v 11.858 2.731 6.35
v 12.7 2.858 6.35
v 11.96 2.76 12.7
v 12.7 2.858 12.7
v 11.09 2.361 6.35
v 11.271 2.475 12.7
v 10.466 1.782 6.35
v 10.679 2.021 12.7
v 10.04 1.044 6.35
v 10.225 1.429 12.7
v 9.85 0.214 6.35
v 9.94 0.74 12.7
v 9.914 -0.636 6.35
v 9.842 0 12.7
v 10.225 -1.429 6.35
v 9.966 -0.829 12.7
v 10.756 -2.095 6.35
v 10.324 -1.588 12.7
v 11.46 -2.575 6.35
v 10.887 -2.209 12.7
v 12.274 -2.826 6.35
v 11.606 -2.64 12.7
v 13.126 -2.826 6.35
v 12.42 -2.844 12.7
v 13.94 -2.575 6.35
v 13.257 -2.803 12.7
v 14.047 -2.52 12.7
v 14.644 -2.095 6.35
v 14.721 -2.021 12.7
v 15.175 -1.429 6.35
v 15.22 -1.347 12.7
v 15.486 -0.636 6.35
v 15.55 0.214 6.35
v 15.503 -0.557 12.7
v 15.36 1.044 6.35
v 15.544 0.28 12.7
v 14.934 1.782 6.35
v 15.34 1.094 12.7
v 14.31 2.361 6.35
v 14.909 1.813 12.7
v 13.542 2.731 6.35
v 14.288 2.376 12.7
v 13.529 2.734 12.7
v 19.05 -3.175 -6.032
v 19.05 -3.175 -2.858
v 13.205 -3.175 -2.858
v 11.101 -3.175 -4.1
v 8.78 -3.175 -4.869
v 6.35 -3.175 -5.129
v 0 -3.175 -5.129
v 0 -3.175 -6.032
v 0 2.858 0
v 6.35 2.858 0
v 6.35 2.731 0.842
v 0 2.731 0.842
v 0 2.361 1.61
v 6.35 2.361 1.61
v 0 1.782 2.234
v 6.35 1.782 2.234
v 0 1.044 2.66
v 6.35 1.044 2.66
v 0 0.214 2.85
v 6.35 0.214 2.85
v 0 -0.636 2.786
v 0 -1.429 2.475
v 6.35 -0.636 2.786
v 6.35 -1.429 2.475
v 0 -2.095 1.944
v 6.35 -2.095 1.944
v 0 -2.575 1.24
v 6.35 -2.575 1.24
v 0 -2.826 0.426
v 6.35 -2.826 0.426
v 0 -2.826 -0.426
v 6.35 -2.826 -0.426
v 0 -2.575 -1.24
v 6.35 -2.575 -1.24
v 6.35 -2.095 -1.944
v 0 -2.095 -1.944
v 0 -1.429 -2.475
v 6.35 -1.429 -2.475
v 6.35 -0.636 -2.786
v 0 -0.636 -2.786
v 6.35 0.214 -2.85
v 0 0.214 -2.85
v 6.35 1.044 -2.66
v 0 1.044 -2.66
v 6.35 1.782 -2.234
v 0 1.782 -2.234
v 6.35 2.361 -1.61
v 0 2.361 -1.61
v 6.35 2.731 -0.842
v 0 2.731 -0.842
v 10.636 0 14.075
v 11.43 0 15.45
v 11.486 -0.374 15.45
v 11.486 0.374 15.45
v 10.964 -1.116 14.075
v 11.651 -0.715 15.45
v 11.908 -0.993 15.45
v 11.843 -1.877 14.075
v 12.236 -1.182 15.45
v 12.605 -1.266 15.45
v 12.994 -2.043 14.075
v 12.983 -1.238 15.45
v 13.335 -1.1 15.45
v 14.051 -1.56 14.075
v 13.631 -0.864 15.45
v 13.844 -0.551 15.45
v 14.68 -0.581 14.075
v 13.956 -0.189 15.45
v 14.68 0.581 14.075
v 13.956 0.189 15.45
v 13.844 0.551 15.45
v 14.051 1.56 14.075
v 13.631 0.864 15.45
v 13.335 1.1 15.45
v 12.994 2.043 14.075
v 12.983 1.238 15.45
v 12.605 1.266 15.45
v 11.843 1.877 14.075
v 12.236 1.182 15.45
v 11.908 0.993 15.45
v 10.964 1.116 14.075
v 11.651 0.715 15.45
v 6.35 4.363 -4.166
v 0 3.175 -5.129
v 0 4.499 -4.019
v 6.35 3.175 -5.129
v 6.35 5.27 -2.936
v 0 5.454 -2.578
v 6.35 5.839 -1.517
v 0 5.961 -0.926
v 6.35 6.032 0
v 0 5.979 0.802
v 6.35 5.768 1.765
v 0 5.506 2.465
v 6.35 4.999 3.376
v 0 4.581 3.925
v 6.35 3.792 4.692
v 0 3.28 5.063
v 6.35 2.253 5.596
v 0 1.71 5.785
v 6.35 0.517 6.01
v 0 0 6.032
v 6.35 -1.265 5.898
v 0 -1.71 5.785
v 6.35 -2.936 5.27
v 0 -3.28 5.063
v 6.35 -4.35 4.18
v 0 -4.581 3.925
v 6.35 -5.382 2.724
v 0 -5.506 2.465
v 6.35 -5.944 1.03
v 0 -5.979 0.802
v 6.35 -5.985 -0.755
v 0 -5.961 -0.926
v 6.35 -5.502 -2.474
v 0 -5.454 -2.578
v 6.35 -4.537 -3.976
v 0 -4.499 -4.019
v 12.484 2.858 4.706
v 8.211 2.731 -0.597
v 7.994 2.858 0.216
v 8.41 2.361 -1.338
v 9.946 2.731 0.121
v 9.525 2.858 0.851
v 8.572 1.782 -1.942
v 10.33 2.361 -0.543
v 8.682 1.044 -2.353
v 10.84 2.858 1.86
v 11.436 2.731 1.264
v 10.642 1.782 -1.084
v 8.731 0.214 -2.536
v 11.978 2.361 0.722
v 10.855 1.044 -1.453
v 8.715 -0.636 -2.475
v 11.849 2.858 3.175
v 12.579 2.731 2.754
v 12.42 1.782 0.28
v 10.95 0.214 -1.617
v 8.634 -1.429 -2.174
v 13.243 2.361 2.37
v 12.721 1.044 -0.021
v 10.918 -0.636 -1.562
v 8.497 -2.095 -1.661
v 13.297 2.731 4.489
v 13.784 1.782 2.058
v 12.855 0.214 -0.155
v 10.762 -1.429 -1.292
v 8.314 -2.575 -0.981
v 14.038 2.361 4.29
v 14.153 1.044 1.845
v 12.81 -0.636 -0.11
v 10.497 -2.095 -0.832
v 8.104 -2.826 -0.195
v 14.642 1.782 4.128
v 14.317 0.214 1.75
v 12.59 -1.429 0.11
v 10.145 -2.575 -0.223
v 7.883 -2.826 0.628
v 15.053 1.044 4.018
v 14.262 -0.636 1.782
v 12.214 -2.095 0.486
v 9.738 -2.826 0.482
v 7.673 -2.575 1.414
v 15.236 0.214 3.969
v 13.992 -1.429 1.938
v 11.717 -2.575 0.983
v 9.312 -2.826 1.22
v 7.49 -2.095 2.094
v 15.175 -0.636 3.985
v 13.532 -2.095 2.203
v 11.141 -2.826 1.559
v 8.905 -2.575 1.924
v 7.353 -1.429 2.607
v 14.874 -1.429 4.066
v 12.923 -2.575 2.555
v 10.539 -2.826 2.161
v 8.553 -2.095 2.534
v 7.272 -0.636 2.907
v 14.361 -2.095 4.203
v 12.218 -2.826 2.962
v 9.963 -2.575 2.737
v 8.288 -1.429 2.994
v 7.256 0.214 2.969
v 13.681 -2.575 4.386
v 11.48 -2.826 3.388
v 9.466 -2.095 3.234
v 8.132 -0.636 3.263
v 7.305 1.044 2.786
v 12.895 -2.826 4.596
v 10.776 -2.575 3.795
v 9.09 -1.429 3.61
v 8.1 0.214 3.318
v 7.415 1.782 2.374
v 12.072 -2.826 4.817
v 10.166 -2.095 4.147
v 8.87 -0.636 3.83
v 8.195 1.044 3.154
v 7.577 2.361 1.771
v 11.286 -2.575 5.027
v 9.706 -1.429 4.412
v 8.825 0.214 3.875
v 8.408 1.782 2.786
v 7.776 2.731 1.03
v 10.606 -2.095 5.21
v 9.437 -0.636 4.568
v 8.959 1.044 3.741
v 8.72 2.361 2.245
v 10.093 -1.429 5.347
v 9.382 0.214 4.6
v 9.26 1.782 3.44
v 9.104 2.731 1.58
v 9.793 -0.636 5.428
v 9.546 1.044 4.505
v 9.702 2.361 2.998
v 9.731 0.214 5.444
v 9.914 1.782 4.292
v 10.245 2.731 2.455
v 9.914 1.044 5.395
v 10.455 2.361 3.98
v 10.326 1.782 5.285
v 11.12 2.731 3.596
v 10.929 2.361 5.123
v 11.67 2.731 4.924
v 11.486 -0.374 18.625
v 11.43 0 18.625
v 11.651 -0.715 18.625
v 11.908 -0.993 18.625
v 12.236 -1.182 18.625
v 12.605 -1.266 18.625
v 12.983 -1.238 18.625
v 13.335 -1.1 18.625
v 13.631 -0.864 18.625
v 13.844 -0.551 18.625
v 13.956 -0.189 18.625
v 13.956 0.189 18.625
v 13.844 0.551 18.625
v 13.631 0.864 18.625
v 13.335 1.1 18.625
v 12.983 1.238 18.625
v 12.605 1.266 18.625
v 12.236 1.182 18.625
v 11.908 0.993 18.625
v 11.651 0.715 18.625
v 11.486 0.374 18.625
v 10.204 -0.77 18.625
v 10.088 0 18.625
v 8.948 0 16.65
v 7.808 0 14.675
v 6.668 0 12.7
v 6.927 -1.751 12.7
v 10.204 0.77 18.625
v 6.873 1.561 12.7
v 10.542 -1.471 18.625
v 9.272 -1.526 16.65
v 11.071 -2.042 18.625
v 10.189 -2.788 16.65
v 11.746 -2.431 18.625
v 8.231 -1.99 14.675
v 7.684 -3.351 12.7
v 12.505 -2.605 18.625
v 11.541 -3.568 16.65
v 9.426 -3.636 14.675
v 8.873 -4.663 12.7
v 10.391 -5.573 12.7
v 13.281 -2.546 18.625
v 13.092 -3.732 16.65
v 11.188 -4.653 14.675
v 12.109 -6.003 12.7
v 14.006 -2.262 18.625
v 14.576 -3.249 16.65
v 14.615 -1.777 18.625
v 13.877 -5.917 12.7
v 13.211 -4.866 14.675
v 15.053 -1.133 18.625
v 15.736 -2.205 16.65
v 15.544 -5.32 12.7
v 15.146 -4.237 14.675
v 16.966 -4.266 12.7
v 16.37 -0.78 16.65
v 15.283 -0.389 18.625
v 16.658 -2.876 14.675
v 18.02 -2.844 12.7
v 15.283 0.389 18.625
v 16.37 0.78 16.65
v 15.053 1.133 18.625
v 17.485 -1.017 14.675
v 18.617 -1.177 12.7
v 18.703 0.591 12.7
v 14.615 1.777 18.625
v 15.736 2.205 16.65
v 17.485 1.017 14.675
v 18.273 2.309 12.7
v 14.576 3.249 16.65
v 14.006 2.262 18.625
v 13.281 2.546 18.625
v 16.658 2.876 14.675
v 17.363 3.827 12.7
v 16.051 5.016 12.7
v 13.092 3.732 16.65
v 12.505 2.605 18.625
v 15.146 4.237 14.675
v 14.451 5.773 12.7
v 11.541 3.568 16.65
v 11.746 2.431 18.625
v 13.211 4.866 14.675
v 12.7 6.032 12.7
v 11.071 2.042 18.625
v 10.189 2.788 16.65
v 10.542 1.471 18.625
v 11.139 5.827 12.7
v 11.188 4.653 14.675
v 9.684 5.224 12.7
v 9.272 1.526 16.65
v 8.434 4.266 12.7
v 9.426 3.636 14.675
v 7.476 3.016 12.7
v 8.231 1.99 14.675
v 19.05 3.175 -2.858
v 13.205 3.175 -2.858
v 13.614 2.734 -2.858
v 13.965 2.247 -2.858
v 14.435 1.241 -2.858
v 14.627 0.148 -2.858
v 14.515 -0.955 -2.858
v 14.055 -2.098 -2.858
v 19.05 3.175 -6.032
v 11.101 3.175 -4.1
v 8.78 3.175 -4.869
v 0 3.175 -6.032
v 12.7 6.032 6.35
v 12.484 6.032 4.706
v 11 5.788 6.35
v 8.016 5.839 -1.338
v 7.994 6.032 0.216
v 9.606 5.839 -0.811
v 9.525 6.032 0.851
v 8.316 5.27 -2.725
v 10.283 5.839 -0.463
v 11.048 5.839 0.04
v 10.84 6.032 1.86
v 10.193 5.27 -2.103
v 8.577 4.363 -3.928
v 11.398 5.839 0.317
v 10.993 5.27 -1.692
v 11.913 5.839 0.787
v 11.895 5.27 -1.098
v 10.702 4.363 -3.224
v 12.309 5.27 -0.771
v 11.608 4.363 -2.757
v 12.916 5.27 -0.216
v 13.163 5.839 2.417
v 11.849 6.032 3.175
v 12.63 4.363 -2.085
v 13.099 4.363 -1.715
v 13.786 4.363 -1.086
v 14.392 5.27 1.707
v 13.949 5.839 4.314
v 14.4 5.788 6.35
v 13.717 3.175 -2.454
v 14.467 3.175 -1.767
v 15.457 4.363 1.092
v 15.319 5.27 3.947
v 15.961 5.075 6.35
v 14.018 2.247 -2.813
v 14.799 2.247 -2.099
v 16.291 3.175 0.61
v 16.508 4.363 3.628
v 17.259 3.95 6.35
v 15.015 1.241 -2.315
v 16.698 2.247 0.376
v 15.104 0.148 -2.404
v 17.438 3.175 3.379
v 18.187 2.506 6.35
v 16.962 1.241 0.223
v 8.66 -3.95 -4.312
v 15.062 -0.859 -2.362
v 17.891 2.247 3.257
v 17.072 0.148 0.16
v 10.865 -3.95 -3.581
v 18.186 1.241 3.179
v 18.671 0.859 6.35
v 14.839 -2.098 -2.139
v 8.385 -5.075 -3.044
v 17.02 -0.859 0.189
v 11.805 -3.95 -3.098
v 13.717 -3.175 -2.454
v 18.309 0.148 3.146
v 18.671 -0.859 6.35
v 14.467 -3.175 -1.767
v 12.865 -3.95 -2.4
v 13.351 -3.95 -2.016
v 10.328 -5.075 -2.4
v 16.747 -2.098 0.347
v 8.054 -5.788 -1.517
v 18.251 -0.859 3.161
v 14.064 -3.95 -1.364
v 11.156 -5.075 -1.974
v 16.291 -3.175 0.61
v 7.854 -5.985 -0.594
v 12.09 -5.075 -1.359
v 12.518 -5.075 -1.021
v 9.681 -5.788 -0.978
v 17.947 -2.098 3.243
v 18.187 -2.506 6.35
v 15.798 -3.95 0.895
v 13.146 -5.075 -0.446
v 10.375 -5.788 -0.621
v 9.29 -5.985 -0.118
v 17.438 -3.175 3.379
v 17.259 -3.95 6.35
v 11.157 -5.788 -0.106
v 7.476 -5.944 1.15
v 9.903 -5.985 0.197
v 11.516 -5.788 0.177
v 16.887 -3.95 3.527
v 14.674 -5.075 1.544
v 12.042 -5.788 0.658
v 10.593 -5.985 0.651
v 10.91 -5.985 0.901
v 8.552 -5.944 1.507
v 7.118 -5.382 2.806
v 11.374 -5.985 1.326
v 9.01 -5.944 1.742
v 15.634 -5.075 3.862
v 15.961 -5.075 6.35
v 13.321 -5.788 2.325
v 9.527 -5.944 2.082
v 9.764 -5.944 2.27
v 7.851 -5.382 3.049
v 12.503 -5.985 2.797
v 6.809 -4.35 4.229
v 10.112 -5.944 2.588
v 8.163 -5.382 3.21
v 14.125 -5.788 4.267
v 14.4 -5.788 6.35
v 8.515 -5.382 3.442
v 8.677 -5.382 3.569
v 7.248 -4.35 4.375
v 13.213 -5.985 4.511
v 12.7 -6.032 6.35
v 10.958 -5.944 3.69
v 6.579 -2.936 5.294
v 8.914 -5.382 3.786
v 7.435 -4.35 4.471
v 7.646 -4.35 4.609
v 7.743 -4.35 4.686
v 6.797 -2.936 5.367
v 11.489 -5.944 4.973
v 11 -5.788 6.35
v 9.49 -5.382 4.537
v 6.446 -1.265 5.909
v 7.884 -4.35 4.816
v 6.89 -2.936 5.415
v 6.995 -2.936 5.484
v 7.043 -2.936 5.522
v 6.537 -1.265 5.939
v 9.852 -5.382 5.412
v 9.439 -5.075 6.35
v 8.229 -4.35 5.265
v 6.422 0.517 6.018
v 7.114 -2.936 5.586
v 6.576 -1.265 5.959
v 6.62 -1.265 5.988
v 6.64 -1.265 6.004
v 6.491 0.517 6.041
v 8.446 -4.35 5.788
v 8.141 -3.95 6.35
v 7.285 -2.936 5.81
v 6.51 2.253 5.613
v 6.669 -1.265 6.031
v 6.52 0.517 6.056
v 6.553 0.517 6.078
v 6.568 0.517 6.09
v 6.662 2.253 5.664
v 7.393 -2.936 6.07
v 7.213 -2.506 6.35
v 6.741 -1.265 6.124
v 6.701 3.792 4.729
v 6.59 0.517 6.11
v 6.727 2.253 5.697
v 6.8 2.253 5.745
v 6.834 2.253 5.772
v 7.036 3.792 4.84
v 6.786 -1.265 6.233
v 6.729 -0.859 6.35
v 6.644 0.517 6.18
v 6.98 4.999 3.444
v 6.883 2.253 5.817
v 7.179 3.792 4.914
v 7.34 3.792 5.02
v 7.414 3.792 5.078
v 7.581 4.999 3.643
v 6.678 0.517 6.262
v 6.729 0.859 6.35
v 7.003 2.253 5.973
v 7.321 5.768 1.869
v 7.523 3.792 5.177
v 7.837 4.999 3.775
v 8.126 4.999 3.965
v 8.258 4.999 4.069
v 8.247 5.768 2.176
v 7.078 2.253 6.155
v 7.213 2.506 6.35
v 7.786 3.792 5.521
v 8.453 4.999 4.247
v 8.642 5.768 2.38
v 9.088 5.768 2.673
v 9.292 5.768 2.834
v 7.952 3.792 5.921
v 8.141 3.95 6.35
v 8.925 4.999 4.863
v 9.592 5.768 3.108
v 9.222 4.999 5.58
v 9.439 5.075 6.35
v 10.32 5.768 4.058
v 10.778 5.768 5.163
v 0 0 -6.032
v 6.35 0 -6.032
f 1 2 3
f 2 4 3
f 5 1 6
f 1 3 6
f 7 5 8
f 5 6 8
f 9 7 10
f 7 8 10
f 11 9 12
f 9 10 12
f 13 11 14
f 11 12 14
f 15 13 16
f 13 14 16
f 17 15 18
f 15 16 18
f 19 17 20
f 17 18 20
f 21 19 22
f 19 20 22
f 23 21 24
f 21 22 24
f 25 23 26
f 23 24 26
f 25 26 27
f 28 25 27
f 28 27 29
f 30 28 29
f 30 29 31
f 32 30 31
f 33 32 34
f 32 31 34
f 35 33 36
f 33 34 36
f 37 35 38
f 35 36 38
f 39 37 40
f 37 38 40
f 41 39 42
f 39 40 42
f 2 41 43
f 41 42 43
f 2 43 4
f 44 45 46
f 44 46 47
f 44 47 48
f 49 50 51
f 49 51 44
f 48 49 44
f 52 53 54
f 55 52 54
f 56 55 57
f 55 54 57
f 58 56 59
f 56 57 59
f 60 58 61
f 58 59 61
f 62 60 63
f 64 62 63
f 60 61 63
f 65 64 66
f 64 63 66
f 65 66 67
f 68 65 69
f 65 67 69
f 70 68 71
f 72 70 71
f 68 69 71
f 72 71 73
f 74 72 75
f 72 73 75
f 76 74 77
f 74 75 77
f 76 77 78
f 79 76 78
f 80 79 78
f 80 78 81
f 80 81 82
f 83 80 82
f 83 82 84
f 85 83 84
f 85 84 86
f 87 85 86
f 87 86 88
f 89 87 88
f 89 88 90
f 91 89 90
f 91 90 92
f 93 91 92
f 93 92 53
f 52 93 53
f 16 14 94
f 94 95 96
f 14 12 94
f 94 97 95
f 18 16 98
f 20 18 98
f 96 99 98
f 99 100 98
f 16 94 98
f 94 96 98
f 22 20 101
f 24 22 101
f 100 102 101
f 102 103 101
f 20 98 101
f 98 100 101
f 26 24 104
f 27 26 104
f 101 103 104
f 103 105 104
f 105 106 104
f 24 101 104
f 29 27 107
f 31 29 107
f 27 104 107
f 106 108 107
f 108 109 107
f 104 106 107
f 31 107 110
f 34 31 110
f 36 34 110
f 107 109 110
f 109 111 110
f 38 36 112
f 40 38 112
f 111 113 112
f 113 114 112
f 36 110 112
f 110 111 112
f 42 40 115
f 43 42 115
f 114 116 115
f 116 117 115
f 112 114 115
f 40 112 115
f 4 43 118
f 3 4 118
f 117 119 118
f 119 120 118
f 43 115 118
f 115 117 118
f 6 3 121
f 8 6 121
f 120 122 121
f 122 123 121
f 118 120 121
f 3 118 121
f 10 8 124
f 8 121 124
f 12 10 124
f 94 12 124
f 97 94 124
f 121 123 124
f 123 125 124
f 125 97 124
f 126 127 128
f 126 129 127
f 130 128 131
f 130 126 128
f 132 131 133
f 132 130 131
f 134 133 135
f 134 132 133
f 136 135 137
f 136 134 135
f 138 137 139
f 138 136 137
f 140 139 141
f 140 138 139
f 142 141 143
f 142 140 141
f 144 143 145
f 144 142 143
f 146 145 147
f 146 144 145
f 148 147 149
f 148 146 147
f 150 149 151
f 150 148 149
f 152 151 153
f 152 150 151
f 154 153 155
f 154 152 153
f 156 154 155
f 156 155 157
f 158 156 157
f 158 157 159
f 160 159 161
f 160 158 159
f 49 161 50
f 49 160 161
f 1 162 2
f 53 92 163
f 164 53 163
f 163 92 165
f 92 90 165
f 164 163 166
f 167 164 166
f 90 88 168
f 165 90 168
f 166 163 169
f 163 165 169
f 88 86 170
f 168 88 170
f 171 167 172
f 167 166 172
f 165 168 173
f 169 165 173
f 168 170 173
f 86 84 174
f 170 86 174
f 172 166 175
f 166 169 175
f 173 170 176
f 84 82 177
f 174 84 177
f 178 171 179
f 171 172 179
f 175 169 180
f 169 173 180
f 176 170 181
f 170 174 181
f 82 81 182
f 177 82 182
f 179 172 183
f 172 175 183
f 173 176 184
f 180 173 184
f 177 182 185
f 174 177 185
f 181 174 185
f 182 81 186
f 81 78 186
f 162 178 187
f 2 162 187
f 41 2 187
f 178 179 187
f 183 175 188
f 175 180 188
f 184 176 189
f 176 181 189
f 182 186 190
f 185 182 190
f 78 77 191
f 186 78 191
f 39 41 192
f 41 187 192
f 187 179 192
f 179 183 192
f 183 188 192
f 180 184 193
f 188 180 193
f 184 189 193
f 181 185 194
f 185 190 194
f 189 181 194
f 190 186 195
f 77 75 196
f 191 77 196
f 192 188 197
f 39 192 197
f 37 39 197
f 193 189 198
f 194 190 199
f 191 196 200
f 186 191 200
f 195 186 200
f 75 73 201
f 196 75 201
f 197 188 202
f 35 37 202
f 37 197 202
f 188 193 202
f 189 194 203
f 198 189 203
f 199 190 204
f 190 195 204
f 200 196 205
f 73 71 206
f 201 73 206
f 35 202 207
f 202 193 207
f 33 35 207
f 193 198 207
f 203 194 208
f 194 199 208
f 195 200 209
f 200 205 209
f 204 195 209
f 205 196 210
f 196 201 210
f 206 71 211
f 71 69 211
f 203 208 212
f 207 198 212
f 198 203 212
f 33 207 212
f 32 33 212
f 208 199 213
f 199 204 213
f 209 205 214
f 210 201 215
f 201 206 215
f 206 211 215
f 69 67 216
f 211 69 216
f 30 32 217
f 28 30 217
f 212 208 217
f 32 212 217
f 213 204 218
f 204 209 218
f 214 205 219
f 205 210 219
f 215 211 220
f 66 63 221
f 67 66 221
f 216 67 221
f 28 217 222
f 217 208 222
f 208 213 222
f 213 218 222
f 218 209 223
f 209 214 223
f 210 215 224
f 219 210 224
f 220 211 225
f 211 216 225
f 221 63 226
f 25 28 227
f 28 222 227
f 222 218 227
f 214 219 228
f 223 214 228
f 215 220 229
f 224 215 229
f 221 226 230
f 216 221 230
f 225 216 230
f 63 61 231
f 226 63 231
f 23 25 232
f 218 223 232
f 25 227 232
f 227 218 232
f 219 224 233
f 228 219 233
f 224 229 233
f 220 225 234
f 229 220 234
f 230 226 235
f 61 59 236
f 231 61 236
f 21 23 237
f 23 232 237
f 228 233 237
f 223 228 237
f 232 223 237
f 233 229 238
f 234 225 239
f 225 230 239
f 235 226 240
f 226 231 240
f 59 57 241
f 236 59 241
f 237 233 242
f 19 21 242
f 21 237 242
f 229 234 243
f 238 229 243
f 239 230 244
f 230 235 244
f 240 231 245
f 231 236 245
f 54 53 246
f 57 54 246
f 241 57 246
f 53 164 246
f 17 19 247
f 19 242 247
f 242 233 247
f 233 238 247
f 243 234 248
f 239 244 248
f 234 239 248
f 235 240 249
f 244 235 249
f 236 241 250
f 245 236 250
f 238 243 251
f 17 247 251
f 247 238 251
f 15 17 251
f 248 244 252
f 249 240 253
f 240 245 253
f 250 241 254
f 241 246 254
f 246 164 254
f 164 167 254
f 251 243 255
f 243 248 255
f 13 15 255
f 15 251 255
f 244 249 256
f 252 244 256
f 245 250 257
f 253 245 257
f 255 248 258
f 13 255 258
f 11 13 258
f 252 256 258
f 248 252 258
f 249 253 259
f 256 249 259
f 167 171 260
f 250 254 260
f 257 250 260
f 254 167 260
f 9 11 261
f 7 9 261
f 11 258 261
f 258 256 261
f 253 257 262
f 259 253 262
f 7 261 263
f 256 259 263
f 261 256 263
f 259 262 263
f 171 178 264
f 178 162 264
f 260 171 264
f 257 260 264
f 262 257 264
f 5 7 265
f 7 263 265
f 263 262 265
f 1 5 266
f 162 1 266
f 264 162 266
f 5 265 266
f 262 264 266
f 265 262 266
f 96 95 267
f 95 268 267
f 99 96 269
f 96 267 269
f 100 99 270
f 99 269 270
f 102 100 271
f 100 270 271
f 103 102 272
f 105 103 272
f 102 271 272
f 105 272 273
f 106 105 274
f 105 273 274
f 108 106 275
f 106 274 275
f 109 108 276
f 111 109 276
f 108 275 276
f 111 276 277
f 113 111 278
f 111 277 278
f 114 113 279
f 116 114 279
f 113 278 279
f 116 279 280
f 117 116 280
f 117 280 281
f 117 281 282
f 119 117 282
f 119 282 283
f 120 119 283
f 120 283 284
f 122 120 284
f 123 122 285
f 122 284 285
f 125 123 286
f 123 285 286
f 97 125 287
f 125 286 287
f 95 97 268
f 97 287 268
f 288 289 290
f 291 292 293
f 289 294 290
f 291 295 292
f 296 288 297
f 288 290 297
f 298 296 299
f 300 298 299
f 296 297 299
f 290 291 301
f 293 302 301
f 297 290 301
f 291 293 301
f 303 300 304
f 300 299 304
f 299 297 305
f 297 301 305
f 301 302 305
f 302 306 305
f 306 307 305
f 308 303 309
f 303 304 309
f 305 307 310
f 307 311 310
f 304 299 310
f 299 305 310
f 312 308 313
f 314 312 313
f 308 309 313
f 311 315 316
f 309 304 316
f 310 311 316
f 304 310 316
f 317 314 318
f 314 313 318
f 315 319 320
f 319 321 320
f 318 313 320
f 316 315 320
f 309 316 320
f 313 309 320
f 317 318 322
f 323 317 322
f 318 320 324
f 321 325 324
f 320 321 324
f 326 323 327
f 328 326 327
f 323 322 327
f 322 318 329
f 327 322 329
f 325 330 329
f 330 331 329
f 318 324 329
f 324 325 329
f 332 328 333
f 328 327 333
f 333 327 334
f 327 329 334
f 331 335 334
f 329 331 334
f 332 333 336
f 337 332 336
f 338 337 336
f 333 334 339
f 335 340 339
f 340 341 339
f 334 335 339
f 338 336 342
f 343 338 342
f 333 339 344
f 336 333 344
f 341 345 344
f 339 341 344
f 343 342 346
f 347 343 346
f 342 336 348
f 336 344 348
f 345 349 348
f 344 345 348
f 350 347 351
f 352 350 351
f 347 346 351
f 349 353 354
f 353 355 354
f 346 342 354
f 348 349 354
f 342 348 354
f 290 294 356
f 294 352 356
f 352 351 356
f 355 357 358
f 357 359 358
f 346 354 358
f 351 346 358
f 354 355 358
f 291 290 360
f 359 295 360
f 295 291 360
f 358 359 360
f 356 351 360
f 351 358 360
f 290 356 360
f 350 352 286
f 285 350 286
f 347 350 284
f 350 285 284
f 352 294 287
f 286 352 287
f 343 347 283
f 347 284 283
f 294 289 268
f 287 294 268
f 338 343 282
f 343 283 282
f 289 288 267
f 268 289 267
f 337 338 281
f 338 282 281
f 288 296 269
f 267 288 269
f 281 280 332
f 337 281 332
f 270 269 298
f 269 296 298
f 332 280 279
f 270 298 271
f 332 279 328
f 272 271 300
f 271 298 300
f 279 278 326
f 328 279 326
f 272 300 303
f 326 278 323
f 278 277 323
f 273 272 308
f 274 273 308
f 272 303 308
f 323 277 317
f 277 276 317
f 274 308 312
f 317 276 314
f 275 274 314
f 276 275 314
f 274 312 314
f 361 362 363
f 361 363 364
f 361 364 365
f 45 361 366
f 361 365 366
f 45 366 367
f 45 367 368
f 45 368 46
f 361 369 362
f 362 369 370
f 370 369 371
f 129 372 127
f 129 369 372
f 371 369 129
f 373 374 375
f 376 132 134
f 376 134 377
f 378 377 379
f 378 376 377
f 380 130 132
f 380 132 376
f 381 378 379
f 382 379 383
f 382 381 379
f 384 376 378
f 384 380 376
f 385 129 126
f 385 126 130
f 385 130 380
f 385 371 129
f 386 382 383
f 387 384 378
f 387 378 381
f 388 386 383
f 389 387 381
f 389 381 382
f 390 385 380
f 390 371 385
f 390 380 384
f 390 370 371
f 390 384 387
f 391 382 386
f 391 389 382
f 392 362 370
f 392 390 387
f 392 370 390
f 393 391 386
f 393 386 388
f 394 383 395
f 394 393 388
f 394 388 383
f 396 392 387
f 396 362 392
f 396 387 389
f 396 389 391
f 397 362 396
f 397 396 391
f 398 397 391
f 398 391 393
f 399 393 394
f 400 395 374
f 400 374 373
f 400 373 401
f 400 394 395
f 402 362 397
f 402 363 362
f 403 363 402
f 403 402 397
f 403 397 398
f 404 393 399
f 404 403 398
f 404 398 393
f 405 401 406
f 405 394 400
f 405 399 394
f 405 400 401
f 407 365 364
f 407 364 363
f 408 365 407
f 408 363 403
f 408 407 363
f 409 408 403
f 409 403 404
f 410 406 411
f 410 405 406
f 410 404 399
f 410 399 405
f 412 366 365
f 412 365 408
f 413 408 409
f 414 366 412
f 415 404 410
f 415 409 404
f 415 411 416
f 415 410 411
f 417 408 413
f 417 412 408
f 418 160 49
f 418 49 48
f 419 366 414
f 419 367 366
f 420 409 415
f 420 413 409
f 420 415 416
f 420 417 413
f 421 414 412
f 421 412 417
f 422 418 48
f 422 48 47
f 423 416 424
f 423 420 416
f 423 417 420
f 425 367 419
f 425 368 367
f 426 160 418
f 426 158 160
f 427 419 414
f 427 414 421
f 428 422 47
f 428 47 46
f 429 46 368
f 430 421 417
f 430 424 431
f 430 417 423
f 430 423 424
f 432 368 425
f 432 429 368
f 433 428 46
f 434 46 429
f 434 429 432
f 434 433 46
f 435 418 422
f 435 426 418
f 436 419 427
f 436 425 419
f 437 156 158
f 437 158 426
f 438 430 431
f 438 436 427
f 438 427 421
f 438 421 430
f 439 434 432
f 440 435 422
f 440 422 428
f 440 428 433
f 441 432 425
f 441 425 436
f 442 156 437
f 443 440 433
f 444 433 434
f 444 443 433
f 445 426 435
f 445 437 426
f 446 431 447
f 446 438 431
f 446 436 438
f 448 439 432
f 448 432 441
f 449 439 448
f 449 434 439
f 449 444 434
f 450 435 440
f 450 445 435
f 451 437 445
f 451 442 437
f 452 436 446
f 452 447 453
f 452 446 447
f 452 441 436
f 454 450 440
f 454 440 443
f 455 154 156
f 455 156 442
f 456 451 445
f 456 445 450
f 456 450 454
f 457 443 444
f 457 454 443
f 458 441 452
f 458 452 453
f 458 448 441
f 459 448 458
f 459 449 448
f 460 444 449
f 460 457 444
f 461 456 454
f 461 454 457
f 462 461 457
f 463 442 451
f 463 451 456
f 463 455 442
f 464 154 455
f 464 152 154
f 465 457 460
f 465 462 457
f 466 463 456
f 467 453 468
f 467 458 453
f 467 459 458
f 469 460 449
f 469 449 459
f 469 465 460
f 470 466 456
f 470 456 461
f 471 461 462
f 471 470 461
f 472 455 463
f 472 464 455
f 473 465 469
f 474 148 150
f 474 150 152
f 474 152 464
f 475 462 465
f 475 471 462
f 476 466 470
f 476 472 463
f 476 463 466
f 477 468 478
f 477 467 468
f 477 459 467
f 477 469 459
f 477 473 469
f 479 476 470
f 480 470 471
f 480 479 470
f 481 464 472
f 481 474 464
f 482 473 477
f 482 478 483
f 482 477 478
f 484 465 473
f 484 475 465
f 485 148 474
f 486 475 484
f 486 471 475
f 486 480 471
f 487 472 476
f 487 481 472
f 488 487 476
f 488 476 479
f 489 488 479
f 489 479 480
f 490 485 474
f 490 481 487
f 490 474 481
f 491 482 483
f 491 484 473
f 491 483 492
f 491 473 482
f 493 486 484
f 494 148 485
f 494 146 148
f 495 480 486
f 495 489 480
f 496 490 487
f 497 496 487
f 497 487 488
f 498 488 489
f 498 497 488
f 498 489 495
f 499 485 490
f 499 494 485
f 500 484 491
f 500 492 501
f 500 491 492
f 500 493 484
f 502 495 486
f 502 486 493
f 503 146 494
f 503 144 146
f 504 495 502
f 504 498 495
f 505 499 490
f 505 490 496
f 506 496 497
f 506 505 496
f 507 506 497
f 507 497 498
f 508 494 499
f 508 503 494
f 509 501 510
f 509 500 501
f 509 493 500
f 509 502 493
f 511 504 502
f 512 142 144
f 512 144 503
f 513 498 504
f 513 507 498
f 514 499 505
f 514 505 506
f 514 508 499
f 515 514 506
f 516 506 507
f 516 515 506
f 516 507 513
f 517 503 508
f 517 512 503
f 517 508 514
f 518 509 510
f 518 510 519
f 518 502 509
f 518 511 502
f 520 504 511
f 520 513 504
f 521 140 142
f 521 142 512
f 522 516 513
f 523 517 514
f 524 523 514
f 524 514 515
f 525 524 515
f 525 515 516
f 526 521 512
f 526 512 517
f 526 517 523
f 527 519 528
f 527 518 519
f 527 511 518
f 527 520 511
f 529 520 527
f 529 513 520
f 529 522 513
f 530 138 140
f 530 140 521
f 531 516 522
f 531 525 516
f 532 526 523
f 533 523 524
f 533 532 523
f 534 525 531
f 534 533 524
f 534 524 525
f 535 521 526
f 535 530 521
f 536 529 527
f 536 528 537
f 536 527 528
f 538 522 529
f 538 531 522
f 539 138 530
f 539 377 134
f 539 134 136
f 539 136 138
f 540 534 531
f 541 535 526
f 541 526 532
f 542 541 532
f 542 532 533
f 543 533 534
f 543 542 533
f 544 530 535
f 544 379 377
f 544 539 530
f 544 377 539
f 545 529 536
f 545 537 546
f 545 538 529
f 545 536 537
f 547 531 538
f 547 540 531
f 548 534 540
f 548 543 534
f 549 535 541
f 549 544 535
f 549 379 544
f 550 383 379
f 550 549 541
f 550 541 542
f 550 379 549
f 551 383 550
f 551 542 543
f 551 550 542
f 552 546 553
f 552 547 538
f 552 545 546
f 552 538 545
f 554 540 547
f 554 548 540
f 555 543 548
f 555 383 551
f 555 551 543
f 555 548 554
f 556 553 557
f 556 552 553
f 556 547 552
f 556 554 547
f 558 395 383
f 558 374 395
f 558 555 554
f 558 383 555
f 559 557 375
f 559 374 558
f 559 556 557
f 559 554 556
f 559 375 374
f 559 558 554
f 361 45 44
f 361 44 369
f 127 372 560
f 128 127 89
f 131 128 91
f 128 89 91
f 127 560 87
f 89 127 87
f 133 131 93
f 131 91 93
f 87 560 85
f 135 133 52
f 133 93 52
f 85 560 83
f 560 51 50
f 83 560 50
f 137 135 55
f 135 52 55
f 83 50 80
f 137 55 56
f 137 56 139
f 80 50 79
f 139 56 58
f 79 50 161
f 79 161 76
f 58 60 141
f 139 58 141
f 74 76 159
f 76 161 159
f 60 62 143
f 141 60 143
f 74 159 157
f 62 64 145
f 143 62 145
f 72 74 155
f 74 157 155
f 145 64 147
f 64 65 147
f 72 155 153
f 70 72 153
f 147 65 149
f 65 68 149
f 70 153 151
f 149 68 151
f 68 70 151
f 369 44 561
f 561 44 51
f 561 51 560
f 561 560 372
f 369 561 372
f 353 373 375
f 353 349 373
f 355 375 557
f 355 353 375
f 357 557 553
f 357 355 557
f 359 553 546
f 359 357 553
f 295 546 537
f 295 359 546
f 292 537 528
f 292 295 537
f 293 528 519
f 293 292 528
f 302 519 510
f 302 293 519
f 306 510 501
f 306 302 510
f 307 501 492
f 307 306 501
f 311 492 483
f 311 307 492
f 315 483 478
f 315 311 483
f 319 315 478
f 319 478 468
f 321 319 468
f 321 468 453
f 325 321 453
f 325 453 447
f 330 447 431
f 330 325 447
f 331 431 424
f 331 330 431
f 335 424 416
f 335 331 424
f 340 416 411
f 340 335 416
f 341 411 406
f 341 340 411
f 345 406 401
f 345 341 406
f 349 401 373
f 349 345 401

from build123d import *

# Parameters (mm, degrees)
F0_R     = 6.0325
F0_R_2   = 2.8575
F6_DEPTH = 19.05


with BuildPart() as f2:
    # F2: sweep along a path in F1
    with BuildLine(Plane.XZ) as f2_path:
        Line((0, 0), (6.35, 0))
        ThreePointArc((6.35, 0), (10.8401280605, 1.8598719395), (12.7, 6.35))
        Line((12.7, 6.35), (12.7, 12.7))
    # F0 (on Right) → F2 (sweep)
    with BuildSketch(Plane.YZ):
        Circle(F0_R)
        Circle(F0_R_2, mode=Mode.SUBTRACT)
    sweep(path=f2_path.line)

    # F3 (on Front) → F4 (revolve)
    with BuildSketch(Plane.XZ):
        Polygon((10.0880871047, 18.624630657), (6.6675, 12.7), (9.8425, 12.7), (11.43, 15.449630657), (11.43, 18.624630657), align=None)
    revolve(axis=Axis((12.7, 0, 16.4198061287), (0, 0, 1)))

    # F5 (on Right) → F6 (join)
    with BuildSketch(Plane.YZ):
        with BuildLine():
            Line((0, -6.0325), (0, -2.8575))
            Line((0, -2.8575), (-3.175, -2.8575))
            Line((-3.175, -2.8575), (-3.175, -5.1293694788))
            ThreePointArc((-3.175, -5.1293694788), (-1.6504749118, -5.8023261556), (0, -6.0325))
        make_face()
        with BuildLine():
            Line((3.175, -2.8575), (0, -2.8575))
            Line((0, -2.8575), (0, -6.0325))
            ThreePointArc((0, -6.0325), (1.6504749118, -5.8023261556), (3.175, -5.1293694788))
            Line((3.175, -5.1293694788), (3.175, -2.8575))
        make_face()
        with BuildLine():
            ThreePointArc((3.175, -5.1293694788), (1.6504749118, -5.8023261556), (0, -6.0325))
            Line((0, -6.0325), (3.175, -6.0325))
            Line((3.175, -6.0325), (3.175, -5.1293694788))
        make_face()
        with BuildLine():
            Line((-3.175, -6.0325), (0, -6.0325))
            ThreePointArc((0, -6.0325), (-1.6504749118, -5.8023261556), (-3.175, -5.1293694788))
            Line((-3.175, -5.1293694788), (-3.175, -6.0325))
        make_face()
    extrude(amount=F6_DEPTH)


solid = f2.part
